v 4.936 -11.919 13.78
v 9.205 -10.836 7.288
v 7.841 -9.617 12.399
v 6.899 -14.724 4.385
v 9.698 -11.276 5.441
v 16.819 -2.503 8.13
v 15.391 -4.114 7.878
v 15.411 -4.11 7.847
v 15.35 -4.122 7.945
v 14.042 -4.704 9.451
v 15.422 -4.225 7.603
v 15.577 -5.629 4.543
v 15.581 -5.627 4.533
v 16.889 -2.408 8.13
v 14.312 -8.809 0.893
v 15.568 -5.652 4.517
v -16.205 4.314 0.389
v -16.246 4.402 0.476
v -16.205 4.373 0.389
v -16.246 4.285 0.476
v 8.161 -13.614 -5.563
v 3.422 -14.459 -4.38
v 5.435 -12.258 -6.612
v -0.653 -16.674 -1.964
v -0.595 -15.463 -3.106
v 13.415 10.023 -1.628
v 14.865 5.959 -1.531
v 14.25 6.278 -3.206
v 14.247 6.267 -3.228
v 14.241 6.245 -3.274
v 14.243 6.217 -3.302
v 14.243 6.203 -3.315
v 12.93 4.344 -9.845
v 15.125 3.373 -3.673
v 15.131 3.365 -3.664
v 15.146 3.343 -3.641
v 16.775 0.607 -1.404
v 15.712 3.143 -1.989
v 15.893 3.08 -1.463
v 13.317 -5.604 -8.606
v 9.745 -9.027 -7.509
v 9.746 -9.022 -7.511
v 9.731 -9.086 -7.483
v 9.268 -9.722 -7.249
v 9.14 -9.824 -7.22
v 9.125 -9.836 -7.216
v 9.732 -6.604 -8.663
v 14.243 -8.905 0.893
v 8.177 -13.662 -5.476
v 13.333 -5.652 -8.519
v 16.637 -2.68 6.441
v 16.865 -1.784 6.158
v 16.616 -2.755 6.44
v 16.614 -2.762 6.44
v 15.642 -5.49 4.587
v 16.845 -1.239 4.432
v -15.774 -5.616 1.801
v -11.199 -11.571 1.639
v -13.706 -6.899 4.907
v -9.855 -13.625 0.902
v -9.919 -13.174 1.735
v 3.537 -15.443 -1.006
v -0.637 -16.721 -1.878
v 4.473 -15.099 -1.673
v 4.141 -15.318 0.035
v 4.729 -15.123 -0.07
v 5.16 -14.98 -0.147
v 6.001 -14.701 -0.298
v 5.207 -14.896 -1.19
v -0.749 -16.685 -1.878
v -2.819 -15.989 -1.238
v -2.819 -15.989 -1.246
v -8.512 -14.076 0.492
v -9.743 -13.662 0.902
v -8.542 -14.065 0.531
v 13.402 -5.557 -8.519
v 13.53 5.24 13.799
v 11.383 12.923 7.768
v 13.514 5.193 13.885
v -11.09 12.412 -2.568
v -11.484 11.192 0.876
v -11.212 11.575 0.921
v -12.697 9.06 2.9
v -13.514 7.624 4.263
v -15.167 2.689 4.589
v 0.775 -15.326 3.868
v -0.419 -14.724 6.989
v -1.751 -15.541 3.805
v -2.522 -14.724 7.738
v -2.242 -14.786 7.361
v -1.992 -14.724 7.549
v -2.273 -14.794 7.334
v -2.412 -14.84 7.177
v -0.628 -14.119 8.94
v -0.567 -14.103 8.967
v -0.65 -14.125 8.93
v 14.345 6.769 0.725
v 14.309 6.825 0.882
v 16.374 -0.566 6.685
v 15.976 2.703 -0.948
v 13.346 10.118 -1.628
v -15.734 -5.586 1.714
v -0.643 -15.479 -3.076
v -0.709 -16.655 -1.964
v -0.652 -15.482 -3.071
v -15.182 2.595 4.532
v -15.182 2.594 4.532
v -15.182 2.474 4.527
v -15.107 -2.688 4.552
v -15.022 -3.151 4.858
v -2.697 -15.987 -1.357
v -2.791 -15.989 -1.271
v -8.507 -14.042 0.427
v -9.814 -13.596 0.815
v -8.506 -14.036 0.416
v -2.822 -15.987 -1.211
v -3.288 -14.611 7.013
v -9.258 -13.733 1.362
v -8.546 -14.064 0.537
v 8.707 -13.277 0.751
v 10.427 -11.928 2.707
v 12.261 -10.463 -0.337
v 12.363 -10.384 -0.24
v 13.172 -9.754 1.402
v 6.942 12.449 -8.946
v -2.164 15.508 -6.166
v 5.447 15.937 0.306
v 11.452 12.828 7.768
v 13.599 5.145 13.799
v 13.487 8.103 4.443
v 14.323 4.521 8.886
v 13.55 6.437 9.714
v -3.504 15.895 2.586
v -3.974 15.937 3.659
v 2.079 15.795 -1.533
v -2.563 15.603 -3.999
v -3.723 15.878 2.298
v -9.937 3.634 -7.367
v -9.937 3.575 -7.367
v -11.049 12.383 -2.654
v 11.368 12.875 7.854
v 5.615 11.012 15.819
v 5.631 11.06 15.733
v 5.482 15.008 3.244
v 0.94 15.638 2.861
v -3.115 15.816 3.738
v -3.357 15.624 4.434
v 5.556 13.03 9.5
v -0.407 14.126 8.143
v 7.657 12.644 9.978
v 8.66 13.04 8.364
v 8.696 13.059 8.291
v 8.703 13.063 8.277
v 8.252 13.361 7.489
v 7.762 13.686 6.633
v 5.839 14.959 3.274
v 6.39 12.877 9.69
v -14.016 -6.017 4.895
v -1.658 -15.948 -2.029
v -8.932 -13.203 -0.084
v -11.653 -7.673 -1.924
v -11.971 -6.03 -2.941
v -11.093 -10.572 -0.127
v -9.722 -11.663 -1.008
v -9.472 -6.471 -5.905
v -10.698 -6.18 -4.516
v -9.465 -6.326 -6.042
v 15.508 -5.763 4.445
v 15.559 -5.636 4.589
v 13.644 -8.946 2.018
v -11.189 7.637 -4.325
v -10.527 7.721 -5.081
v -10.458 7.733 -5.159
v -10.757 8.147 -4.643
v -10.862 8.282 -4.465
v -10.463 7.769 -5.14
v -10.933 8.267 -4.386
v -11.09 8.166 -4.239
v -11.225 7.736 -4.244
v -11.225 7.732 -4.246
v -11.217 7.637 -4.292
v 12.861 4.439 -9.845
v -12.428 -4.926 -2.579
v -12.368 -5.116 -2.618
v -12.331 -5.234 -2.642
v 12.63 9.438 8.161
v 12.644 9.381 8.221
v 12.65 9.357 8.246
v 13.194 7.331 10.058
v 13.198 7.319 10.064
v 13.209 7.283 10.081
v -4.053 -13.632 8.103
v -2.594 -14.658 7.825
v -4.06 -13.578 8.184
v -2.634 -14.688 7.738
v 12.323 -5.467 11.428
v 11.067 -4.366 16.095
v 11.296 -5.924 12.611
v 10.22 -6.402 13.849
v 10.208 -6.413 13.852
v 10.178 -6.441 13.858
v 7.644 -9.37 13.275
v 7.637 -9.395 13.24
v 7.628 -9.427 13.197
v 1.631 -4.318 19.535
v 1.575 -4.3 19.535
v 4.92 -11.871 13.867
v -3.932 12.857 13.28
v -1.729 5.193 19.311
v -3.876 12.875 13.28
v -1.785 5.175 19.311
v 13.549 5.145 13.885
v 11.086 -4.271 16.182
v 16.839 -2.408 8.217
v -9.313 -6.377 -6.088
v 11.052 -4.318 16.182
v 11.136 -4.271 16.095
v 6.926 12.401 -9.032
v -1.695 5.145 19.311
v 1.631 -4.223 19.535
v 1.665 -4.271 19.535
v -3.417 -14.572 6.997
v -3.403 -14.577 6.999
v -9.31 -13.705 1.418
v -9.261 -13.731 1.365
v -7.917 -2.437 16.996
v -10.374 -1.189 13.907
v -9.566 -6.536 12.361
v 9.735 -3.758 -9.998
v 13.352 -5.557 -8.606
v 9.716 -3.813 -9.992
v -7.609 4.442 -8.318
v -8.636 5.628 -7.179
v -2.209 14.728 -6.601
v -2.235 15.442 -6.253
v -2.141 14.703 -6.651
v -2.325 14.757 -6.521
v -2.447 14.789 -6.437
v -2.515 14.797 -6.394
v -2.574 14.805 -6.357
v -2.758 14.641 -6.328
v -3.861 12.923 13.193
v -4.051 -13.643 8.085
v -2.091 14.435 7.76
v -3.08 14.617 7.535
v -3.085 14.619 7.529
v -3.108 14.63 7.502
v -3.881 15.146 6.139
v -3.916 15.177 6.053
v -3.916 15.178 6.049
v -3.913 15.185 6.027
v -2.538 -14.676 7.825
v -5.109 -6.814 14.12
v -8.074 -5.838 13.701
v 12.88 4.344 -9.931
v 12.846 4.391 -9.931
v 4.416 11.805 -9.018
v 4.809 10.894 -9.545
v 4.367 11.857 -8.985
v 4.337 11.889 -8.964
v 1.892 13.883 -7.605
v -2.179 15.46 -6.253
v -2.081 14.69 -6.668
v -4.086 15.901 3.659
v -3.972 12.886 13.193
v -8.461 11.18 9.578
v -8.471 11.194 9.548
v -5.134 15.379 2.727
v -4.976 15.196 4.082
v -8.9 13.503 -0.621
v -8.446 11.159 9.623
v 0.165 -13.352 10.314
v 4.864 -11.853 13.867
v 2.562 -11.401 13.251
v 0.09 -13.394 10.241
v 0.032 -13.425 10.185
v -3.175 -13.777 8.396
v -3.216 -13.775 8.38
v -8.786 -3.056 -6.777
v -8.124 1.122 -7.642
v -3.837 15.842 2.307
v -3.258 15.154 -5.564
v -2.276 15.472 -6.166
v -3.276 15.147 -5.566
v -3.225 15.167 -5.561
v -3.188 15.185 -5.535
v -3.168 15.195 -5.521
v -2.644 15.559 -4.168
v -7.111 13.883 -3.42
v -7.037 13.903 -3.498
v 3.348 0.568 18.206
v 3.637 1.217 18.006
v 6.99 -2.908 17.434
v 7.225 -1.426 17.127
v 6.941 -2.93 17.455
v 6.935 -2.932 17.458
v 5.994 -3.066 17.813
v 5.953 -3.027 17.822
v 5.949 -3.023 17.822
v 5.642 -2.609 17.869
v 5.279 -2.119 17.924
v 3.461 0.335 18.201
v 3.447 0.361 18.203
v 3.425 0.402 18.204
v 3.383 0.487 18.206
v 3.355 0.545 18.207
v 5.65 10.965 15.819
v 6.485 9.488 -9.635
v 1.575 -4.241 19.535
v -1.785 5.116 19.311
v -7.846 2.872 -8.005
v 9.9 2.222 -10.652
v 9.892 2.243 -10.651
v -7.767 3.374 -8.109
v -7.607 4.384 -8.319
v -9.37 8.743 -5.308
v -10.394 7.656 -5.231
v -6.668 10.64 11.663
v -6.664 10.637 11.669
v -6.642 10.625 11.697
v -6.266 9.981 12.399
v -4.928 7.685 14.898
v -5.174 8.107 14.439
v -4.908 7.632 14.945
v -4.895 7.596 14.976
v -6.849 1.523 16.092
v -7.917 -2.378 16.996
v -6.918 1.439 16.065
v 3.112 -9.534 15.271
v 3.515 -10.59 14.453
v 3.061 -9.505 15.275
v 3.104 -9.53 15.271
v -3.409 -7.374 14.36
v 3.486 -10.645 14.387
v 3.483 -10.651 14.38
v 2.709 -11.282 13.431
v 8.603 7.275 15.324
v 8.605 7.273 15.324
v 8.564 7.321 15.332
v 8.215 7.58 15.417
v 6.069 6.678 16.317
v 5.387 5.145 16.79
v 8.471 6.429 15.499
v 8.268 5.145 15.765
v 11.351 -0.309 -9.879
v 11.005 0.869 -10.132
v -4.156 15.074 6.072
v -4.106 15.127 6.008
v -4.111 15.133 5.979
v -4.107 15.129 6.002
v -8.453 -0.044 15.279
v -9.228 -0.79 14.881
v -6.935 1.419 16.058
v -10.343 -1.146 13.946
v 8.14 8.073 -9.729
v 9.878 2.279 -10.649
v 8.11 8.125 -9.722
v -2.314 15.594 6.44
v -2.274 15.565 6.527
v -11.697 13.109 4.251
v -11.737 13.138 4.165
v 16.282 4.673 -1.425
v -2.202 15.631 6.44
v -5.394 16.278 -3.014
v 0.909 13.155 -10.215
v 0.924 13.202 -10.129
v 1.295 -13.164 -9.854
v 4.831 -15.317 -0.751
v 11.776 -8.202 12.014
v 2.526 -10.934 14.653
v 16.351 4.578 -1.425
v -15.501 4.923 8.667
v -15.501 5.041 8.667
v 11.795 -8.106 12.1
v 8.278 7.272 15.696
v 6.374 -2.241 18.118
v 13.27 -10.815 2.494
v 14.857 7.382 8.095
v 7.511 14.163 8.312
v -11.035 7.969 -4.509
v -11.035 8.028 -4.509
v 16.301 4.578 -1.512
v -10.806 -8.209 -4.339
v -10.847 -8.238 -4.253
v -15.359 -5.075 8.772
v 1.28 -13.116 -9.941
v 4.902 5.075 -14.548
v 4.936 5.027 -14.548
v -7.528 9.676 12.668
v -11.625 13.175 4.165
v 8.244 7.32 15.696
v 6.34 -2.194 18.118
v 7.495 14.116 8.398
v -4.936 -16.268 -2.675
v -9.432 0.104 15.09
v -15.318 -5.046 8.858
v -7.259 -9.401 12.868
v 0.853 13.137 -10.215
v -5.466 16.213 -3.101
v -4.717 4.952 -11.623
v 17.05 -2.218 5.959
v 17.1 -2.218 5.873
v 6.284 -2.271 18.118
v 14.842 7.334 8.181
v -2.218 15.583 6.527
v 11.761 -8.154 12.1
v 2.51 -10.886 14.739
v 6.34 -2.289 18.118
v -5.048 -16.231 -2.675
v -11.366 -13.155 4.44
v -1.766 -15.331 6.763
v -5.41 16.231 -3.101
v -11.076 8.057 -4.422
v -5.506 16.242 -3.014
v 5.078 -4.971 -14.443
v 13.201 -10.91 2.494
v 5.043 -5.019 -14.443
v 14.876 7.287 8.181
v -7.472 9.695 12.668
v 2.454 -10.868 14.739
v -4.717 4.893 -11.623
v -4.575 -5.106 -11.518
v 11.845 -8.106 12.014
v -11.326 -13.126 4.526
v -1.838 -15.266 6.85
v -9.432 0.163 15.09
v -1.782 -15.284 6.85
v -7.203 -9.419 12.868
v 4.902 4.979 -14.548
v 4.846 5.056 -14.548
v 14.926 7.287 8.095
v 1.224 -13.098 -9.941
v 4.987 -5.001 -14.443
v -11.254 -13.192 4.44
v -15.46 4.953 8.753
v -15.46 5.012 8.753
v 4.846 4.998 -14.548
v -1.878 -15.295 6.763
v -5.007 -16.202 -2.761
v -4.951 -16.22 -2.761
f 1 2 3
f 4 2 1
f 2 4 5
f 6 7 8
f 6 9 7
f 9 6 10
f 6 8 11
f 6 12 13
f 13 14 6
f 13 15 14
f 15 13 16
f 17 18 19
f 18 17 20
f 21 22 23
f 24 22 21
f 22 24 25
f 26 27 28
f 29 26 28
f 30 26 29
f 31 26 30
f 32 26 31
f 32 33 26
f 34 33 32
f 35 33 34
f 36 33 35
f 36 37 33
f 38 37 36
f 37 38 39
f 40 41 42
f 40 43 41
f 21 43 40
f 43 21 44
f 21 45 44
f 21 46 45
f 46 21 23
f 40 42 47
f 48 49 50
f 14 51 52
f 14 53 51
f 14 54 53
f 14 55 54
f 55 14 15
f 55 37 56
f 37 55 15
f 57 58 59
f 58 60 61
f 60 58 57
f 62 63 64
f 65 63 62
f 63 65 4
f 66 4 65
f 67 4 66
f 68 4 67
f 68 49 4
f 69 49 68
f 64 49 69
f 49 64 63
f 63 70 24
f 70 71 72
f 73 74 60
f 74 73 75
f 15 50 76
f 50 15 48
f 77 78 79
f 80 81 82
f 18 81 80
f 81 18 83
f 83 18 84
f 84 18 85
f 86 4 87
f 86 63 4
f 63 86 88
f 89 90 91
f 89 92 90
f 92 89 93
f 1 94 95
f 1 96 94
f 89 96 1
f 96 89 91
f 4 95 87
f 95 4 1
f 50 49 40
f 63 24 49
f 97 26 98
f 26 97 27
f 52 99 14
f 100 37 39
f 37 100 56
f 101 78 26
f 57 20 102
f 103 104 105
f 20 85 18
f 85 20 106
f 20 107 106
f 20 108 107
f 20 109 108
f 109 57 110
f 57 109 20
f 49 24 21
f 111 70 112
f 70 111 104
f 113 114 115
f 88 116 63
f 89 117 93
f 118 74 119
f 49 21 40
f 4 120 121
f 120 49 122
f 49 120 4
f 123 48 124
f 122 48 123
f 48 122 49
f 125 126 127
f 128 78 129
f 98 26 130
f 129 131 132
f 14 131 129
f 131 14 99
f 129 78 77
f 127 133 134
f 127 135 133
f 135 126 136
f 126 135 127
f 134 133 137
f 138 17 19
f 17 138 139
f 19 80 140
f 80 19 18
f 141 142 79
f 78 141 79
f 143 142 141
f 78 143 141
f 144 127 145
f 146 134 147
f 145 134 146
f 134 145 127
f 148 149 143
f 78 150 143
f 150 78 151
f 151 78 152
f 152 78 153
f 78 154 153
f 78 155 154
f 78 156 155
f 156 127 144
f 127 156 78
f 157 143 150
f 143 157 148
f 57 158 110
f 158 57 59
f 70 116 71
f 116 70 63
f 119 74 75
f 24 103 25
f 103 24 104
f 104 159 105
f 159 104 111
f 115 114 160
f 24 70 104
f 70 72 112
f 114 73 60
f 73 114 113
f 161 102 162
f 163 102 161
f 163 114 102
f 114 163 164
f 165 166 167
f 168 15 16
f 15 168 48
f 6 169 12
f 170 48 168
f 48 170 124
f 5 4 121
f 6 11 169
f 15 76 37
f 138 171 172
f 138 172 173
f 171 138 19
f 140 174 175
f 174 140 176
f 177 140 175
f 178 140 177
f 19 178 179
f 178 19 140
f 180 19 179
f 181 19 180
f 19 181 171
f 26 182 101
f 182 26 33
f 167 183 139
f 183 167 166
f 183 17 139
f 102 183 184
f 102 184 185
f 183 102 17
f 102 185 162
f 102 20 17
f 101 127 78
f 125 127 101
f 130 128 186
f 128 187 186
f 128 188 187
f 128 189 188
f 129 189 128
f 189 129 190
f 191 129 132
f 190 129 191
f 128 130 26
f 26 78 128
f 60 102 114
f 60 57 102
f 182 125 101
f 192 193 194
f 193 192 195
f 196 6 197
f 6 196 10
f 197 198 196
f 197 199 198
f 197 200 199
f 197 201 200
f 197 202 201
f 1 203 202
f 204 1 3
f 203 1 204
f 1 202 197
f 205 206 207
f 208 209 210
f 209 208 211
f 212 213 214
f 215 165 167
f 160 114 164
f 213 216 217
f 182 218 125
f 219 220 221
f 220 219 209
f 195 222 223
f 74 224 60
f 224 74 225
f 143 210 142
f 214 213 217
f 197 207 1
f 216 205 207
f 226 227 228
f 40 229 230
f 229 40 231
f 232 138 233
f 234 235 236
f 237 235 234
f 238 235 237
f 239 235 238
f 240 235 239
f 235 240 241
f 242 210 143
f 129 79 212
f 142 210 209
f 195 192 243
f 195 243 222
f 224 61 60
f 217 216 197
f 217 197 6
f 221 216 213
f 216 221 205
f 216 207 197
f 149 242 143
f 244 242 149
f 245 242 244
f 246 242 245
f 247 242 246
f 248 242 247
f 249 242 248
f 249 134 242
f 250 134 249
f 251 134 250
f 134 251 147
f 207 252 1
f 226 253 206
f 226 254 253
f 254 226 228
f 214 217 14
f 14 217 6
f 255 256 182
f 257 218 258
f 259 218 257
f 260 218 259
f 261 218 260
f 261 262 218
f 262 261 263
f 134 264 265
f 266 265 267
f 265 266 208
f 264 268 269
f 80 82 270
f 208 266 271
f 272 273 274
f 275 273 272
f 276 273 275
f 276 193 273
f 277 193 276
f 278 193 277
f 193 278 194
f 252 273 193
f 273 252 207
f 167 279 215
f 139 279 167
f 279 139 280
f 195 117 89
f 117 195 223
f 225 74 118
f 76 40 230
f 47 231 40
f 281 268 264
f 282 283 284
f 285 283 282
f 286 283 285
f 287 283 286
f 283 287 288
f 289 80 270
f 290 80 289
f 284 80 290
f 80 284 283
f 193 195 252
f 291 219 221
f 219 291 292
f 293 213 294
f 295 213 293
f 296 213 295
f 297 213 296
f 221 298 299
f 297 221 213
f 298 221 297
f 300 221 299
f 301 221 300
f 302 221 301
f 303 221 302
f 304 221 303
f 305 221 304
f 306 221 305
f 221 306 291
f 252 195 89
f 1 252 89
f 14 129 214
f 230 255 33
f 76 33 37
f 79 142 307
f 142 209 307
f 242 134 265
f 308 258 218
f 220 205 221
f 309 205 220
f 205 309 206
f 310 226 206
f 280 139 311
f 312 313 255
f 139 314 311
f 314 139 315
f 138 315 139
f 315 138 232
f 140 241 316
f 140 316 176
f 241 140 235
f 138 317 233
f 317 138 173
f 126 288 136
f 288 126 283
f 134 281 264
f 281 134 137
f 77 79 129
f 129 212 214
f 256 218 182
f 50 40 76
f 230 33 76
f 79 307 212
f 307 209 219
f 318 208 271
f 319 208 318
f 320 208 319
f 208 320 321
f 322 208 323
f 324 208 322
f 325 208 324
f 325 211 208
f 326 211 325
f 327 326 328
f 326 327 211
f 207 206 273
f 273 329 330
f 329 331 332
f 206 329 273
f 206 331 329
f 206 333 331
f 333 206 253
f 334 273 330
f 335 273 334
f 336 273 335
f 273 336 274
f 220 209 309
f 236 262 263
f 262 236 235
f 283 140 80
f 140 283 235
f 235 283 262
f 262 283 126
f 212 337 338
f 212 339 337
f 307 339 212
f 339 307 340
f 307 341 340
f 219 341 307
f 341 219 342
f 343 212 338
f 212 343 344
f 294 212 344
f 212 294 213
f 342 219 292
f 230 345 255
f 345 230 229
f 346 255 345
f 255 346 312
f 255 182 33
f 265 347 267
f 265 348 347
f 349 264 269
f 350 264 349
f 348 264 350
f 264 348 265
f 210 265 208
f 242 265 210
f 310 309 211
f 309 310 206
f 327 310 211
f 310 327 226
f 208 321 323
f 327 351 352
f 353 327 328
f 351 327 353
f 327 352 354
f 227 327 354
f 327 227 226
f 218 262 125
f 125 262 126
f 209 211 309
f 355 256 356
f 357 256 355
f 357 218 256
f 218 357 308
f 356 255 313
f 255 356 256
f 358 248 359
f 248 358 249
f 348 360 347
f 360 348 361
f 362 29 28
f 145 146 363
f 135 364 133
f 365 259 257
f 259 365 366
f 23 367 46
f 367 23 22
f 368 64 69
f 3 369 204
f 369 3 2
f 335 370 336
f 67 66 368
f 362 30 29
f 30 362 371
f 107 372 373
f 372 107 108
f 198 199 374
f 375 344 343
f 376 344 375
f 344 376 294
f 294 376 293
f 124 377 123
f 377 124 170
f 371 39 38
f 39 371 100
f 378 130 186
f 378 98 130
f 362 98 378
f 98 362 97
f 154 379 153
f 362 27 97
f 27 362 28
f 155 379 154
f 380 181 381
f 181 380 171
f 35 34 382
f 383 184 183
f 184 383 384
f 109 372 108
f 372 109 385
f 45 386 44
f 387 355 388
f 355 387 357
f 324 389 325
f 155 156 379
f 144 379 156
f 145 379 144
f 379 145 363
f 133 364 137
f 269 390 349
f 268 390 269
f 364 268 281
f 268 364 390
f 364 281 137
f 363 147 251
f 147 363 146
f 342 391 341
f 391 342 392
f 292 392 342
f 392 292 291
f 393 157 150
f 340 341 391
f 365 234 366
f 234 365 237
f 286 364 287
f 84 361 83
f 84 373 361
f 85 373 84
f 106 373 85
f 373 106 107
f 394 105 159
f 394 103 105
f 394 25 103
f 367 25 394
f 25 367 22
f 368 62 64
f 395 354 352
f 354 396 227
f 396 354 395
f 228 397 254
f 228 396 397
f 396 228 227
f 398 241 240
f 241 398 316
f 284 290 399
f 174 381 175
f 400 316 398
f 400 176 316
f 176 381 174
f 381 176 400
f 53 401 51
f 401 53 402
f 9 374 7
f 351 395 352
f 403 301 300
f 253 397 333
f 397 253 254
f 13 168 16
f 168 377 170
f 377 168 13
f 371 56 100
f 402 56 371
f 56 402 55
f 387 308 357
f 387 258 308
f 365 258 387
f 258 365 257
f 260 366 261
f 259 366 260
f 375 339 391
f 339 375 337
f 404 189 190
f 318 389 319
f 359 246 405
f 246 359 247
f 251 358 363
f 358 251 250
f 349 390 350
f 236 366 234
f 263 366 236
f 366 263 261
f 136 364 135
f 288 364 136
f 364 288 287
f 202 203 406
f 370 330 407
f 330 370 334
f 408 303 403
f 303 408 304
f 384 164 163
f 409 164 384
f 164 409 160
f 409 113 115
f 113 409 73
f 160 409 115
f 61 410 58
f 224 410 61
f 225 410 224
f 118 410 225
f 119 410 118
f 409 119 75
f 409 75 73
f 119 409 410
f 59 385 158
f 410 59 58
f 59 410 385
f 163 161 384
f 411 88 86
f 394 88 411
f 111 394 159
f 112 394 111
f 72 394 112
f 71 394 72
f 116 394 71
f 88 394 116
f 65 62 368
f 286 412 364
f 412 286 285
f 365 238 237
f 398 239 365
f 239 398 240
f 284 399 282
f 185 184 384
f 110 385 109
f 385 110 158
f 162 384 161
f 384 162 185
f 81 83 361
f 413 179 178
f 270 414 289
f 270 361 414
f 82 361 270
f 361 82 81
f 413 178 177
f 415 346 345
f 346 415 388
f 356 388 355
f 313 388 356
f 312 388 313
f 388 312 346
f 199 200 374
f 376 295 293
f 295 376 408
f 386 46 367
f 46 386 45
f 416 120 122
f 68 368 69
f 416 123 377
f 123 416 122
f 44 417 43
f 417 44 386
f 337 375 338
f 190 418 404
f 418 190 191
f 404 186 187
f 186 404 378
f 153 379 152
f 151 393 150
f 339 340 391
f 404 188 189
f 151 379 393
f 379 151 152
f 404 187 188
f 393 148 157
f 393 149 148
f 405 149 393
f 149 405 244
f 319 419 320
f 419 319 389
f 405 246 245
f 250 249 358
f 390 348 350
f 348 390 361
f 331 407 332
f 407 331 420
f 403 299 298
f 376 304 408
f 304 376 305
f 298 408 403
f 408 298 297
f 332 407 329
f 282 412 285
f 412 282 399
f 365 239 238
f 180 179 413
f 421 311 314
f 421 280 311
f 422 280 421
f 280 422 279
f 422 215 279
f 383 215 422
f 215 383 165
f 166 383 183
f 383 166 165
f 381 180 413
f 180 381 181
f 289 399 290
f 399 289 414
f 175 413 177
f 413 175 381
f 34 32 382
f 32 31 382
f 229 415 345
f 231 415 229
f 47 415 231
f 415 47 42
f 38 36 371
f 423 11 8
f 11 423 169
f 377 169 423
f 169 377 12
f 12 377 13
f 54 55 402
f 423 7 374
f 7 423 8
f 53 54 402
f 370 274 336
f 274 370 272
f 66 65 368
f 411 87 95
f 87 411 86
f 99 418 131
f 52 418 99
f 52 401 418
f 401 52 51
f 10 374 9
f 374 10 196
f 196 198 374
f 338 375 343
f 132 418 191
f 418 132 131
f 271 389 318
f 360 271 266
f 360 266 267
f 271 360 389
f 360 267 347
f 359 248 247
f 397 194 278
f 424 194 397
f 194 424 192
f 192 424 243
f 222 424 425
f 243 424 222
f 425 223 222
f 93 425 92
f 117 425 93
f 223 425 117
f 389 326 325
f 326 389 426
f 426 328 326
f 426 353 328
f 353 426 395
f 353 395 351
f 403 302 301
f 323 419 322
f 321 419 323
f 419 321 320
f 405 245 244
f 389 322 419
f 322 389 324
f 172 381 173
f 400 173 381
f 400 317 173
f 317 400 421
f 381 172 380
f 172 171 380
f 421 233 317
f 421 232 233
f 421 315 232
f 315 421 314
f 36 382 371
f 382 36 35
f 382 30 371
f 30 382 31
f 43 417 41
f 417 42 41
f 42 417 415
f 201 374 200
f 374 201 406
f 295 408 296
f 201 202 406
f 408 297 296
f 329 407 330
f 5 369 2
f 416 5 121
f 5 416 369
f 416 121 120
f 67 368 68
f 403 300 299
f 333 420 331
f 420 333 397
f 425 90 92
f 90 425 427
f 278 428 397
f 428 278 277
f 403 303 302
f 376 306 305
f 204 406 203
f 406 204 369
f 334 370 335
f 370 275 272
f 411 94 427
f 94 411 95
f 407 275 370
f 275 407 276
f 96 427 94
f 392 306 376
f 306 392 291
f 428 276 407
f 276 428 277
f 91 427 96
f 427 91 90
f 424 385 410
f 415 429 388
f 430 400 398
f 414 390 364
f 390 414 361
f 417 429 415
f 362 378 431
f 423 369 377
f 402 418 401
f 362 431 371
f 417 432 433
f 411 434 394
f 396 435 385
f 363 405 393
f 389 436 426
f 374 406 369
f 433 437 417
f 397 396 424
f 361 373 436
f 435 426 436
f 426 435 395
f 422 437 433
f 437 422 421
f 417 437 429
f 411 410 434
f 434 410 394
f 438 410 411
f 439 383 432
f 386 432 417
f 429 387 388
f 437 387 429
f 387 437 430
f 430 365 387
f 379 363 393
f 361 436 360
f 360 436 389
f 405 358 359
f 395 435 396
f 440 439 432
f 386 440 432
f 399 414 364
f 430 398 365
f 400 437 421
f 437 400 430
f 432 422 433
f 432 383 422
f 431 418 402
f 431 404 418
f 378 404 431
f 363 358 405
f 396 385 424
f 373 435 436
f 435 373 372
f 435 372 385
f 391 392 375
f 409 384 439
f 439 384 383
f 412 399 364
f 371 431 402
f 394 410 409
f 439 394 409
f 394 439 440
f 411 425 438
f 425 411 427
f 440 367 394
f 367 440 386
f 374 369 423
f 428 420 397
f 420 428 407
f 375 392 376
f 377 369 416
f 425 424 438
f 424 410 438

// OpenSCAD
// Auto-generated OpenSCAD file

    inner_points = 10*[[0.9785360441964507, 0.9685060087804973, -0.7092049571073851], [-0.7218333121630555, -0.9371211507350073, 1.2781211700972077], [-1.1656165136305032, 1.3079692585994611, 0.41648198007898896], [0.12642830900148935, -1.3068898411312557, -0.9853981930688116], [-0.22333094402334933, 1.5535674106354085, 0.6440329700277245], [1.005476703886223, -0.9333113753571688, -0.6892343037094695], [-0.7487739718528278, 0.9646962334026586, 1.2581505166992923], [0.4800336760567444, -1.5221825525899184, -0.07511675703790183], [0.08934767207892022, 1.3107372224336087, -1.012885439345699], [0.48861147976637076, 0.5027013227208416, -1.446090236925663], [-1.5277996843953847, -0.5016219052526364, 0.8771740239358404], [-1.128535876707934, -1.309657804965403, 0.4439692263558762], [0.43644277299934864, 1.5550226153402404, -0.10742995301327285], [1.1958876650432781, 0.018046999695751874, -0.9314344442707686], [-0.939184933009883, 0.013337858349738127, 1.5003506572605914], [-0.17974004096595367, -1.5236377572947502, 0.6763461660030955], [-0.5425111962571489, 1.6183222038887703, -0.3014461589511666], [0.5027750227462976, -0.4971432456893552, -1.4355910431050312], [-1.5419632273753114, 0.4982226631575605, 0.8666748301152085], [-0.4966770083718649, -1.617242786420565, -0.2674700540386561], [1.4826091915535184, 0.7286877016062595, 0.809489031294333], [0.6324245133737653, -0.22412587815149274, 1.8031520948966295], [1.6999608124003458, -0.22177130747848592, 0.5872595441309494], [1.1745177845708672, -0.8106424847112358, 1.2013770908025172], [0.8228354745308205, 0.7272324969014278, 1.5609519543353303], [1.6251024487516763, 0.45780294600218496, -0.14251785987525334], [0.24947474274244444, -1.083881810988317, 1.4652627503986109], [0.7479771108821508, 1.4068067503820987, 0.8311745503291275], [-0.10220756729760253, 0.45399317062434624, 1.824837613931424], [1.317011041769025, -1.0815272403153102, 0.2493701996329309], [-1.0994824342008114, 0.7998110906252263, -0.4422389058083036], [-0.453460022884815, -0.5076184592401323, -1.1431789923822038], [-1.4758291479456198, -0.00993550481667447, 0.007953944227915899], [-1.0765653402581692, -0.8179714045294413, -0.42525085335204815], [-0.4676235658647422, 0.4922261091700644, -1.1536781862028358]];

    outer_points = 10*[[1.6675078734833215, 0.0606578658798944, -0.14037183476169734], [-1.3812010323162374, 0.0606578658798944, 0.9447594765080658], [-0.21947760683013753, 1.5412866403759968, -0.6166289071353418], [-0.0668292343369466, -1.6626023721357857, -0.1877587346110266], [0.5416162372999497, 1.5841976272977822, 0.030591926605881947], [0.6867934666614489, -1.4628818955379934, 0.4384716988297587], [-0.40048662549436476, 1.5841976272977822, 0.36591594291660967], [-0.2553093961328655, -1.4628818955379934, 0.7737957151404864], [1.2830083443582905, 0.43437021059876024, -0.9844685090279552], [1.3301792856223638, -0.5556859423585491, -0.8519403373374261], [-1.616486126789448, 0.43437021059876024, 0.047552695591057736], [-1.5693151855253746, -0.5556859423585491, 0.1800808672815868], [1.3315198473616163, 1.0022572216480545, -0.16279279637858096], [1.421244309499562, -0.8809414898882658, 0.08929076617934018], [-1.1349374683324778, 1.0022572216480545, 0.7150968755670284], [-1.0452130061945322, -0.8809414898882658, 0.9671804381249495], [0.6910920823419752, 1.2353424637267059, -0.8945875406321075], [0.814587209852644, -1.3566581954864947, -0.5476242826794208], [-1.100894051019728, 1.2353424637267059, -0.25676335906694764], [-0.9773989235090593, -1.3566581954864947, 0.09019989888573907], [1.3498755222367103, 0.5145289147819359, 1.3798731287754311], [-0.1744789306630692, 0.5145289147819359, 1.9224387844103128], [1.1036119582529507, -0.4270704409862244, 1.6095357297164685], [0.16150909545863612, -0.4270704409862244, 1.9448597460271964], [0.5599719121750438, 1.0964693204316633, 1.573257851759894], [1.6788523044425723, -0.24077480503880566, 0.8130481402697834], [-0.7876050112515218, -0.24077480503880566, 1.6909378122153926], [1.1352122583646653, 1.2827649563790822, 0.7767702623132089], [-0.38914219453511406, 1.2827649563790822, 1.3193359179480906], [0.4904858776644981, -1.182374160806966, 1.3780347575215486], [-0.10820638536813701, 0.6663583620181512, -1.0879241680961655], [-0.03188219912154147, -0.93558614423774, -0.8734890818340078], [-0.9896228295577276, 0.3604141853688603, -0.7280586200277711], [-0.9424518882936543, -0.629641967588449, -0.595530448337242], [0.483709876648178, -0.13461389110979438, -1.177805136492013]];

    // Convex hull for inner set (I)
    module inner_hull() {
        hull() {
            for (p = inner_points) {
                translate(p) sphere(r=0.1);
            }
        }
    }

    // Convex hull for outer set (O) minus inner hull (O \ I)
    module outer_minus_inner() {
        difference() {
            hull() {
                for (p = outer_points) {
                    translate(p) sphere(r=0.1);
                }
            }
            inner_hull(); // Subtract inner hull
        }
    }

    // Convex hull for outer set (O) minus all translated inner hulls
    module outer_minus_AllTranslationInner() {
        difference() {
            hull() {
                for (p = outer_points) {
                    translate(p) sphere(r=0.1);
                }
            }
            hull() {
                translate([0,0,50]) inner_hull();
                translate([0,0,-50]) inner_hull();
            }; // Subtract translated inner hulls
        }
    }

    // Difference between outer_minus_inner and outer_minus_AllTranslationInner
    module outer_minus_inner_diff() {
        difference() {
            // Outer minus inner
            difference() {
                hull() {
                    for (p = outer_points) {
                        translate(p) sphere(r=0.1);
                    }
                }
                inner_hull();
            }

            // Subtract Outer minus AllTranslationInner
            difference() {
                hull() {
                    for (p = outer_points) {
                        translate(p) sphere(r=0.1);
                    }
                }
                hull() {
                    translate([0,0,50]) inner_hull();
                    translate([0,0,-50]) inner_hull();
                };
            }
        }
    }

    // Rendering all with colors applied
    color([1, 0, 0, 0.5]) inner_hull(); // Transparent red
    color([0, 1, 0, 1]) outer_minus_AllTranslationInner(); // Opaque green
    color([1, 1, 0, 1]) outer_minus_inner_diff(); // Opaque yellow
    
